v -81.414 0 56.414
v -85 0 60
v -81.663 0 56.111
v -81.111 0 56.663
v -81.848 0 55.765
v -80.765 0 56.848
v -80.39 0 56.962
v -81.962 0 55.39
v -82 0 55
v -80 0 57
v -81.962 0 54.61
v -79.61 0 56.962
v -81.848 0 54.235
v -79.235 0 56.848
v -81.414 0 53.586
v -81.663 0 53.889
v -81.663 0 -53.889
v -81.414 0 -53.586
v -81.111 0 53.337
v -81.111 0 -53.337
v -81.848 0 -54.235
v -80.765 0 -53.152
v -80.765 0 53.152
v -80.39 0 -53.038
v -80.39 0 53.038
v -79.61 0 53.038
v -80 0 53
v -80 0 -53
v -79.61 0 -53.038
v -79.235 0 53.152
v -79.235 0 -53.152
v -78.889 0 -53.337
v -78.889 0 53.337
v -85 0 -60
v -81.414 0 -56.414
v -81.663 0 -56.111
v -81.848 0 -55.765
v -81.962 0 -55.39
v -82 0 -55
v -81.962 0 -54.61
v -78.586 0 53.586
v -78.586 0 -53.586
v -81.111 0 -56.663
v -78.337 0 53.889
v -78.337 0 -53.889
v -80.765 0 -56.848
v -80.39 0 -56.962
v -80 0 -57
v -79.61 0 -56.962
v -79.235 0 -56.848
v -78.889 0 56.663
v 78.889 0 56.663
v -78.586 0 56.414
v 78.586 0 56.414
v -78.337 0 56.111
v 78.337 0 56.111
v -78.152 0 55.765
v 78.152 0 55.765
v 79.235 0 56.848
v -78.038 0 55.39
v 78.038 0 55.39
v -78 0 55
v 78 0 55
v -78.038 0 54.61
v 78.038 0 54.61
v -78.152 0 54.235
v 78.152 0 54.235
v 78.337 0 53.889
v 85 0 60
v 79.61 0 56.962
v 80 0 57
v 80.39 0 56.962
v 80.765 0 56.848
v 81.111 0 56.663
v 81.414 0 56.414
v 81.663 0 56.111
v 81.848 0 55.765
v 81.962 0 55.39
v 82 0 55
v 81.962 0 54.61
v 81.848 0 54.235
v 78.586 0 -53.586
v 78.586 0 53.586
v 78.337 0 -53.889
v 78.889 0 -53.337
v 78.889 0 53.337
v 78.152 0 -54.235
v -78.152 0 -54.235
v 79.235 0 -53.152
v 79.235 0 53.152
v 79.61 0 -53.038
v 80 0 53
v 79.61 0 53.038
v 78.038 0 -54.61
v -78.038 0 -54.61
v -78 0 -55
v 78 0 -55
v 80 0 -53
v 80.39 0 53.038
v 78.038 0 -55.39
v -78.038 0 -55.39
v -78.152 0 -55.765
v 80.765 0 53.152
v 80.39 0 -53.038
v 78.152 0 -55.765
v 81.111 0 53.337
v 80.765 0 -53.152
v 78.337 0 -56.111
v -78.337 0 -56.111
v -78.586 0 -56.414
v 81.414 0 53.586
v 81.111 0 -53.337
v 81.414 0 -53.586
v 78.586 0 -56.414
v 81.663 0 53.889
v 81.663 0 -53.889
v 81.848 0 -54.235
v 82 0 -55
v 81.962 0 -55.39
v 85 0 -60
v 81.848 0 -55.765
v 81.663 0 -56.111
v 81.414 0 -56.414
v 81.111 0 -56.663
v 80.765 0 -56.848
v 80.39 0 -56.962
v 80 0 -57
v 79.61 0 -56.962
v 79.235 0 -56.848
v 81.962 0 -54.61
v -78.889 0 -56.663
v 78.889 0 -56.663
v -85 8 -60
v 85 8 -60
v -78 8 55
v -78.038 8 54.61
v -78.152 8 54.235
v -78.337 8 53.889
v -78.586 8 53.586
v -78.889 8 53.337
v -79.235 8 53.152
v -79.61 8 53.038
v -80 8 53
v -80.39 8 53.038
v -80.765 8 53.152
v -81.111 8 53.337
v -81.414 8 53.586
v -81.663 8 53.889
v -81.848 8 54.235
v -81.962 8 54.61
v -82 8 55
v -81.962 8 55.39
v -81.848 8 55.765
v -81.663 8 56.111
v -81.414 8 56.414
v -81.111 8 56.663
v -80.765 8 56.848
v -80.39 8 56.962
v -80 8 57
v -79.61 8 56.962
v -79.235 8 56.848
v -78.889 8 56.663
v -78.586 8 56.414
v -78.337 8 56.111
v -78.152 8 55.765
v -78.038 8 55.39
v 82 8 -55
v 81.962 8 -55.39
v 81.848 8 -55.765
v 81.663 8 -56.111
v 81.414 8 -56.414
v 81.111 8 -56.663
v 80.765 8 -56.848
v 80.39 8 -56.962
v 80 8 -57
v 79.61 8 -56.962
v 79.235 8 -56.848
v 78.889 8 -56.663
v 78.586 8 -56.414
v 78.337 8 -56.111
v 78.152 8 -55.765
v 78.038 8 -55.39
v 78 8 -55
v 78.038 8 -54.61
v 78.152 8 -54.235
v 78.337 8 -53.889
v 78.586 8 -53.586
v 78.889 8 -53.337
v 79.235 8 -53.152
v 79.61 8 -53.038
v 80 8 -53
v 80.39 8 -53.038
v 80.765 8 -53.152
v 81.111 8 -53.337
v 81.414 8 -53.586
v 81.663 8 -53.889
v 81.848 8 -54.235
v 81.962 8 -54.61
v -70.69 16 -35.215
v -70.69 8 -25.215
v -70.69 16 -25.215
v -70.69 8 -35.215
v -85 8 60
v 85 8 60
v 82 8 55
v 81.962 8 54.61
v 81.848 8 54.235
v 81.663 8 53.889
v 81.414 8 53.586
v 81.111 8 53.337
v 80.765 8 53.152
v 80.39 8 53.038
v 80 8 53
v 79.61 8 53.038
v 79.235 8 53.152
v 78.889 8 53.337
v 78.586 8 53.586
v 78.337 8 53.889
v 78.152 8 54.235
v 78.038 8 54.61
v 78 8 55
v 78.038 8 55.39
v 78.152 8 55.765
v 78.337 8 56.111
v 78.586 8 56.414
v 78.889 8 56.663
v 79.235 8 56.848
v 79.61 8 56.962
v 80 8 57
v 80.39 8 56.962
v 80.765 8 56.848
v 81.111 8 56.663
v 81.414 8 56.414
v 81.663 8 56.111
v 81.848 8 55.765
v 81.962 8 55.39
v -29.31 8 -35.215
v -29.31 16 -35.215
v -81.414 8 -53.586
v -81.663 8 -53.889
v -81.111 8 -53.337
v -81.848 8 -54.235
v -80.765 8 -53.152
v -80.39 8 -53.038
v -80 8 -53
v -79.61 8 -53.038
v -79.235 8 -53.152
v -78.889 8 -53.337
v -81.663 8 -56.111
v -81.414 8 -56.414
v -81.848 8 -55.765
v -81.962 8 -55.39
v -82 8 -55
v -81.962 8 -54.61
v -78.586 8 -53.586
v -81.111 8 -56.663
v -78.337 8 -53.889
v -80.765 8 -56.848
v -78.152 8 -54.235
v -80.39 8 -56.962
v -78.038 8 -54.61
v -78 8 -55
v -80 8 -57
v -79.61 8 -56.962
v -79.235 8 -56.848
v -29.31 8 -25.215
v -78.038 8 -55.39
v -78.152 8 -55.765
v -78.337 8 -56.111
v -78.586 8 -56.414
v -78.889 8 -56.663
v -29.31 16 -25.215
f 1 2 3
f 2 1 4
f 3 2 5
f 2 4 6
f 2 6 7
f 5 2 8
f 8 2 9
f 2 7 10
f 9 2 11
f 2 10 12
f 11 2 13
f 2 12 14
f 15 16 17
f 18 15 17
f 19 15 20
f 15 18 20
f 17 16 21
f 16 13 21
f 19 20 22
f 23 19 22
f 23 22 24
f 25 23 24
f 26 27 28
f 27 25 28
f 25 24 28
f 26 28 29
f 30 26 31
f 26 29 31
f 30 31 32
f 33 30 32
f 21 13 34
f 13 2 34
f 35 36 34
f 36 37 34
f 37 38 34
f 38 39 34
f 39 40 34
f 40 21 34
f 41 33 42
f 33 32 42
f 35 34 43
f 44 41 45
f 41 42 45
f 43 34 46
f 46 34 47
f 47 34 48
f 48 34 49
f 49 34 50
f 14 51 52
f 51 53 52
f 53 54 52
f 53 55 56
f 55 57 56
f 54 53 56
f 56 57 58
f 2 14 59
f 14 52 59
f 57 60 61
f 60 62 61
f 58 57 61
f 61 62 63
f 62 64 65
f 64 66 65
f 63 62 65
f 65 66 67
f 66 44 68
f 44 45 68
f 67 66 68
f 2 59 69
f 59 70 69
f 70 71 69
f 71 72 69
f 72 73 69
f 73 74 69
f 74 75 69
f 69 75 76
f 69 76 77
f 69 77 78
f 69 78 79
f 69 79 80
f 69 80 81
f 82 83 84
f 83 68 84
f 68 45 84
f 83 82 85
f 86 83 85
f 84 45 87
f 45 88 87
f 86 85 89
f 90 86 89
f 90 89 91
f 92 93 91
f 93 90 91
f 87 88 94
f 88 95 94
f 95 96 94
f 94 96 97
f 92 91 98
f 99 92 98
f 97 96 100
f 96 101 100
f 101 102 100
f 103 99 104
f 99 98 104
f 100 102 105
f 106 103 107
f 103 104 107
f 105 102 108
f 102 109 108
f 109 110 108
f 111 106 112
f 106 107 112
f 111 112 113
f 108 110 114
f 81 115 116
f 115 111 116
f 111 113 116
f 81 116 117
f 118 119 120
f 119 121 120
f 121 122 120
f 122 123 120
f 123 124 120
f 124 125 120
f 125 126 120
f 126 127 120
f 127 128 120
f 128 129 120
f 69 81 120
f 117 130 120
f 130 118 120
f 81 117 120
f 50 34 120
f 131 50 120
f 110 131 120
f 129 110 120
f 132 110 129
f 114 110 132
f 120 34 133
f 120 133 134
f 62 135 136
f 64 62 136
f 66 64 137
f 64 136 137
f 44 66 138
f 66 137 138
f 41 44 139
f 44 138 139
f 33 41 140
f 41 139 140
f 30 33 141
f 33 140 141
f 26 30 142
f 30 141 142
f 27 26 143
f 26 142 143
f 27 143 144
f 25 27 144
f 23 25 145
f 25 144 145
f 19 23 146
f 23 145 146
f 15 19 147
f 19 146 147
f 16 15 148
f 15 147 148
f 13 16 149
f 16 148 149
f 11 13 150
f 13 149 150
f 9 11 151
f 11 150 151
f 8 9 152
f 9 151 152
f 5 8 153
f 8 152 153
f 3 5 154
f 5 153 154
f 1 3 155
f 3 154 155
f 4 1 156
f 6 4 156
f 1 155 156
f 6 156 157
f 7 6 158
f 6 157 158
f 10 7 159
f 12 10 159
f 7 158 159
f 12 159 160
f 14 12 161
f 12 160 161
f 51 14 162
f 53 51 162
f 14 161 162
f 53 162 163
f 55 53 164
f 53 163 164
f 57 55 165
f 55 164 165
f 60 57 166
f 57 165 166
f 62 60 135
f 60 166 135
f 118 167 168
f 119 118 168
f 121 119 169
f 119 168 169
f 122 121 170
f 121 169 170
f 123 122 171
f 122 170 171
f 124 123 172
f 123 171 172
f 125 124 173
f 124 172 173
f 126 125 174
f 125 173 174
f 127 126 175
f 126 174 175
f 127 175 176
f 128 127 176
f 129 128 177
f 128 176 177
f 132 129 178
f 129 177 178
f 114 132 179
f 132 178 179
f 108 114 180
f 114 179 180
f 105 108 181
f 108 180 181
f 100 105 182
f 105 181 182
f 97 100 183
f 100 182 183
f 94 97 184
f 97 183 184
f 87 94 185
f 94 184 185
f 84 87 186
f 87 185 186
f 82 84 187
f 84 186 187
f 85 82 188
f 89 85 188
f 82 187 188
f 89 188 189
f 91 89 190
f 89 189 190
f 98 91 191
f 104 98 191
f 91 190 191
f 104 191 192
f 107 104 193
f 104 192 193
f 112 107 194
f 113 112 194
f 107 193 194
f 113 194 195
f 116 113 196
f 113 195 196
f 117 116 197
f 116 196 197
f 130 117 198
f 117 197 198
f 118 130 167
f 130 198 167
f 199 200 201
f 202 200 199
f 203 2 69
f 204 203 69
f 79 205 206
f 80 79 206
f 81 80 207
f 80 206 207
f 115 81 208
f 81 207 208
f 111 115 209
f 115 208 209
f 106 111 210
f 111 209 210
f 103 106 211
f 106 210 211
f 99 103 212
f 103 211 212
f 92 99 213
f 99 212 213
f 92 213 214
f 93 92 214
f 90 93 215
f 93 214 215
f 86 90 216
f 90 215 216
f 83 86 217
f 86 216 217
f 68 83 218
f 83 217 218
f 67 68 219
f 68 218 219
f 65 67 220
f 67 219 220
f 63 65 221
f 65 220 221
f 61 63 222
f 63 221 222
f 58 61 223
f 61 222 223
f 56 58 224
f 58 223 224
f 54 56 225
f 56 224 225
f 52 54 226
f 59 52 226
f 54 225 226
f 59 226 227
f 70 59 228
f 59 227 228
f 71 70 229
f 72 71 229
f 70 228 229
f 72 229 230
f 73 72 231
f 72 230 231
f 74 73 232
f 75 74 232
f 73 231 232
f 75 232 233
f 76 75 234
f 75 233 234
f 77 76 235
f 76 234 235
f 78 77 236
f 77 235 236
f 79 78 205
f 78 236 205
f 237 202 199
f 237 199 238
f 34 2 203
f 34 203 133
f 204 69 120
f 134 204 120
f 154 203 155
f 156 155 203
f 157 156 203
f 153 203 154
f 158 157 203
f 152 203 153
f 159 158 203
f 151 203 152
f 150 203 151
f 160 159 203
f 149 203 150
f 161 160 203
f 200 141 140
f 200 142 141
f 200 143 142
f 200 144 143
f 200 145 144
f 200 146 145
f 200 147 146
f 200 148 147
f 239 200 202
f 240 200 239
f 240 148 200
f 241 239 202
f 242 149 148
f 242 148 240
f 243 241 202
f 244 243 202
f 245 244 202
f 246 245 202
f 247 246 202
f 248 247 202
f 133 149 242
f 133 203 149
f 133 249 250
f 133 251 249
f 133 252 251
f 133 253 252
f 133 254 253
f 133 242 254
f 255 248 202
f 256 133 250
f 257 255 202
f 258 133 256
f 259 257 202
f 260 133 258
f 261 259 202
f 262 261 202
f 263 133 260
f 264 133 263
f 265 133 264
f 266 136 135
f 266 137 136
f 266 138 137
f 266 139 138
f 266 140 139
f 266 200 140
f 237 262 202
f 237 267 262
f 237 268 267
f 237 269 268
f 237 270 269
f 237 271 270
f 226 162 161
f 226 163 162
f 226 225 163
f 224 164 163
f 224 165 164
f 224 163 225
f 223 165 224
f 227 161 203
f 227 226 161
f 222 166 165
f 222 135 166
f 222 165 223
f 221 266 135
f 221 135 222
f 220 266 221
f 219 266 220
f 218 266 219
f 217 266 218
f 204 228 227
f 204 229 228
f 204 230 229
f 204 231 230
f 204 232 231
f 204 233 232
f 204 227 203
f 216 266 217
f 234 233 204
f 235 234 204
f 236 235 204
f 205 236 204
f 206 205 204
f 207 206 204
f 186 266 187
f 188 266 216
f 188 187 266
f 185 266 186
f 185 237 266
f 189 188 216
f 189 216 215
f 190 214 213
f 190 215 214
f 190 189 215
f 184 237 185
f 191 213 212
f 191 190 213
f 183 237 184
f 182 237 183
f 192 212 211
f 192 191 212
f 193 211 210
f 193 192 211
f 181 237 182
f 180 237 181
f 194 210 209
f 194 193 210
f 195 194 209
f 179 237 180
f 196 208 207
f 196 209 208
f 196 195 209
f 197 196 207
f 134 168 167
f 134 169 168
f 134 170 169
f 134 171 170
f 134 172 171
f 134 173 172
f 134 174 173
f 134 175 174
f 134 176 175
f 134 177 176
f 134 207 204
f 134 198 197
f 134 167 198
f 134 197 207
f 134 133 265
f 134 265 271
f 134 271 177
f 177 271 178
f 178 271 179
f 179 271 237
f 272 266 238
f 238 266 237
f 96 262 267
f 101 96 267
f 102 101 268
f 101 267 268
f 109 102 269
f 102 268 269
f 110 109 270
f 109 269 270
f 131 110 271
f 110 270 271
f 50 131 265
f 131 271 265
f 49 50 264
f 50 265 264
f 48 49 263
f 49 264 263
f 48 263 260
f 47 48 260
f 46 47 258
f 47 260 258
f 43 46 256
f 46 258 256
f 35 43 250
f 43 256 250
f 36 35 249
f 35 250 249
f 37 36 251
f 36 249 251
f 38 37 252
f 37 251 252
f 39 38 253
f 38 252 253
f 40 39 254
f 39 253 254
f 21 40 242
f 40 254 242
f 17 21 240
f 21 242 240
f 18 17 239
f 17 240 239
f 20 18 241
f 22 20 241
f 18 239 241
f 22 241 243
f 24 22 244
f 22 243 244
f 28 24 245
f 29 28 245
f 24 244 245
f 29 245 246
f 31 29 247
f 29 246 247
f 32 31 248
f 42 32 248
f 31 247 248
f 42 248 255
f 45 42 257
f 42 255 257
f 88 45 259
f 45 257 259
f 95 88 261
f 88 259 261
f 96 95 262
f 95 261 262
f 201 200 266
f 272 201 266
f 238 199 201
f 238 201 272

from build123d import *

# Parameters (mm, degrees)
SKETCH1_W           = 170
SKETCH1_H           = 120
BOSS_EXTRUDE1_DEPTH = 8
SKETCH2_W           = 41.380626675
SKETCH2_H           = 10
BOSS_EXTRUDE2_DEPTH = 8
SKETCH3_R           = 2
CUT_EXTRUDE1_DEPTH  = 8


with BuildPart() as part:
    # Sketch1 → Boss-Extrude1 (new body)
    with BuildSketch(Plane(origin=(0, 0, 0), x_dir=(1, 0, 0), z_dir=(0, 1, 0))):
        Rectangle(SKETCH1_W, SKETCH1_H)
    extrude(amount=BOSS_EXTRUDE1_DEPTH)

    # Sketch2 → Boss-Extrude2 (add)
    with BuildSketch(Plane(origin=(-17.791513114, 8, -1.374929401), x_dir=(1, 0, 0), z_dir=(0, 1, 0))):
        with Locations((-32.208486886, 28.840032215)):
            Rectangle(SKETCH2_W, SKETCH2_H)
    extrude(amount=BOSS_EXTRUDE2_DEPTH)

    # Sketch3 → Cut-Extrude1 (cut)
    with BuildSketch(Plane(origin=(0, 8, 0), x_dir=(1, 0, 0), z_dir=(0, 1, 0))):
        with Locations((-80, 55)):
            Circle(SKETCH3_R)
        with Locations((-80, -55)):
            Circle(SKETCH3_R)
        with Locations((80, 55)):
            Circle(SKETCH3_R)
        with Locations((80, -55)):
            Circle(SKETCH3_R)
    extrude(amount=-CUT_EXTRUDE1_DEPTH, mode=Mode.SUBTRACT)


solid = part.part
